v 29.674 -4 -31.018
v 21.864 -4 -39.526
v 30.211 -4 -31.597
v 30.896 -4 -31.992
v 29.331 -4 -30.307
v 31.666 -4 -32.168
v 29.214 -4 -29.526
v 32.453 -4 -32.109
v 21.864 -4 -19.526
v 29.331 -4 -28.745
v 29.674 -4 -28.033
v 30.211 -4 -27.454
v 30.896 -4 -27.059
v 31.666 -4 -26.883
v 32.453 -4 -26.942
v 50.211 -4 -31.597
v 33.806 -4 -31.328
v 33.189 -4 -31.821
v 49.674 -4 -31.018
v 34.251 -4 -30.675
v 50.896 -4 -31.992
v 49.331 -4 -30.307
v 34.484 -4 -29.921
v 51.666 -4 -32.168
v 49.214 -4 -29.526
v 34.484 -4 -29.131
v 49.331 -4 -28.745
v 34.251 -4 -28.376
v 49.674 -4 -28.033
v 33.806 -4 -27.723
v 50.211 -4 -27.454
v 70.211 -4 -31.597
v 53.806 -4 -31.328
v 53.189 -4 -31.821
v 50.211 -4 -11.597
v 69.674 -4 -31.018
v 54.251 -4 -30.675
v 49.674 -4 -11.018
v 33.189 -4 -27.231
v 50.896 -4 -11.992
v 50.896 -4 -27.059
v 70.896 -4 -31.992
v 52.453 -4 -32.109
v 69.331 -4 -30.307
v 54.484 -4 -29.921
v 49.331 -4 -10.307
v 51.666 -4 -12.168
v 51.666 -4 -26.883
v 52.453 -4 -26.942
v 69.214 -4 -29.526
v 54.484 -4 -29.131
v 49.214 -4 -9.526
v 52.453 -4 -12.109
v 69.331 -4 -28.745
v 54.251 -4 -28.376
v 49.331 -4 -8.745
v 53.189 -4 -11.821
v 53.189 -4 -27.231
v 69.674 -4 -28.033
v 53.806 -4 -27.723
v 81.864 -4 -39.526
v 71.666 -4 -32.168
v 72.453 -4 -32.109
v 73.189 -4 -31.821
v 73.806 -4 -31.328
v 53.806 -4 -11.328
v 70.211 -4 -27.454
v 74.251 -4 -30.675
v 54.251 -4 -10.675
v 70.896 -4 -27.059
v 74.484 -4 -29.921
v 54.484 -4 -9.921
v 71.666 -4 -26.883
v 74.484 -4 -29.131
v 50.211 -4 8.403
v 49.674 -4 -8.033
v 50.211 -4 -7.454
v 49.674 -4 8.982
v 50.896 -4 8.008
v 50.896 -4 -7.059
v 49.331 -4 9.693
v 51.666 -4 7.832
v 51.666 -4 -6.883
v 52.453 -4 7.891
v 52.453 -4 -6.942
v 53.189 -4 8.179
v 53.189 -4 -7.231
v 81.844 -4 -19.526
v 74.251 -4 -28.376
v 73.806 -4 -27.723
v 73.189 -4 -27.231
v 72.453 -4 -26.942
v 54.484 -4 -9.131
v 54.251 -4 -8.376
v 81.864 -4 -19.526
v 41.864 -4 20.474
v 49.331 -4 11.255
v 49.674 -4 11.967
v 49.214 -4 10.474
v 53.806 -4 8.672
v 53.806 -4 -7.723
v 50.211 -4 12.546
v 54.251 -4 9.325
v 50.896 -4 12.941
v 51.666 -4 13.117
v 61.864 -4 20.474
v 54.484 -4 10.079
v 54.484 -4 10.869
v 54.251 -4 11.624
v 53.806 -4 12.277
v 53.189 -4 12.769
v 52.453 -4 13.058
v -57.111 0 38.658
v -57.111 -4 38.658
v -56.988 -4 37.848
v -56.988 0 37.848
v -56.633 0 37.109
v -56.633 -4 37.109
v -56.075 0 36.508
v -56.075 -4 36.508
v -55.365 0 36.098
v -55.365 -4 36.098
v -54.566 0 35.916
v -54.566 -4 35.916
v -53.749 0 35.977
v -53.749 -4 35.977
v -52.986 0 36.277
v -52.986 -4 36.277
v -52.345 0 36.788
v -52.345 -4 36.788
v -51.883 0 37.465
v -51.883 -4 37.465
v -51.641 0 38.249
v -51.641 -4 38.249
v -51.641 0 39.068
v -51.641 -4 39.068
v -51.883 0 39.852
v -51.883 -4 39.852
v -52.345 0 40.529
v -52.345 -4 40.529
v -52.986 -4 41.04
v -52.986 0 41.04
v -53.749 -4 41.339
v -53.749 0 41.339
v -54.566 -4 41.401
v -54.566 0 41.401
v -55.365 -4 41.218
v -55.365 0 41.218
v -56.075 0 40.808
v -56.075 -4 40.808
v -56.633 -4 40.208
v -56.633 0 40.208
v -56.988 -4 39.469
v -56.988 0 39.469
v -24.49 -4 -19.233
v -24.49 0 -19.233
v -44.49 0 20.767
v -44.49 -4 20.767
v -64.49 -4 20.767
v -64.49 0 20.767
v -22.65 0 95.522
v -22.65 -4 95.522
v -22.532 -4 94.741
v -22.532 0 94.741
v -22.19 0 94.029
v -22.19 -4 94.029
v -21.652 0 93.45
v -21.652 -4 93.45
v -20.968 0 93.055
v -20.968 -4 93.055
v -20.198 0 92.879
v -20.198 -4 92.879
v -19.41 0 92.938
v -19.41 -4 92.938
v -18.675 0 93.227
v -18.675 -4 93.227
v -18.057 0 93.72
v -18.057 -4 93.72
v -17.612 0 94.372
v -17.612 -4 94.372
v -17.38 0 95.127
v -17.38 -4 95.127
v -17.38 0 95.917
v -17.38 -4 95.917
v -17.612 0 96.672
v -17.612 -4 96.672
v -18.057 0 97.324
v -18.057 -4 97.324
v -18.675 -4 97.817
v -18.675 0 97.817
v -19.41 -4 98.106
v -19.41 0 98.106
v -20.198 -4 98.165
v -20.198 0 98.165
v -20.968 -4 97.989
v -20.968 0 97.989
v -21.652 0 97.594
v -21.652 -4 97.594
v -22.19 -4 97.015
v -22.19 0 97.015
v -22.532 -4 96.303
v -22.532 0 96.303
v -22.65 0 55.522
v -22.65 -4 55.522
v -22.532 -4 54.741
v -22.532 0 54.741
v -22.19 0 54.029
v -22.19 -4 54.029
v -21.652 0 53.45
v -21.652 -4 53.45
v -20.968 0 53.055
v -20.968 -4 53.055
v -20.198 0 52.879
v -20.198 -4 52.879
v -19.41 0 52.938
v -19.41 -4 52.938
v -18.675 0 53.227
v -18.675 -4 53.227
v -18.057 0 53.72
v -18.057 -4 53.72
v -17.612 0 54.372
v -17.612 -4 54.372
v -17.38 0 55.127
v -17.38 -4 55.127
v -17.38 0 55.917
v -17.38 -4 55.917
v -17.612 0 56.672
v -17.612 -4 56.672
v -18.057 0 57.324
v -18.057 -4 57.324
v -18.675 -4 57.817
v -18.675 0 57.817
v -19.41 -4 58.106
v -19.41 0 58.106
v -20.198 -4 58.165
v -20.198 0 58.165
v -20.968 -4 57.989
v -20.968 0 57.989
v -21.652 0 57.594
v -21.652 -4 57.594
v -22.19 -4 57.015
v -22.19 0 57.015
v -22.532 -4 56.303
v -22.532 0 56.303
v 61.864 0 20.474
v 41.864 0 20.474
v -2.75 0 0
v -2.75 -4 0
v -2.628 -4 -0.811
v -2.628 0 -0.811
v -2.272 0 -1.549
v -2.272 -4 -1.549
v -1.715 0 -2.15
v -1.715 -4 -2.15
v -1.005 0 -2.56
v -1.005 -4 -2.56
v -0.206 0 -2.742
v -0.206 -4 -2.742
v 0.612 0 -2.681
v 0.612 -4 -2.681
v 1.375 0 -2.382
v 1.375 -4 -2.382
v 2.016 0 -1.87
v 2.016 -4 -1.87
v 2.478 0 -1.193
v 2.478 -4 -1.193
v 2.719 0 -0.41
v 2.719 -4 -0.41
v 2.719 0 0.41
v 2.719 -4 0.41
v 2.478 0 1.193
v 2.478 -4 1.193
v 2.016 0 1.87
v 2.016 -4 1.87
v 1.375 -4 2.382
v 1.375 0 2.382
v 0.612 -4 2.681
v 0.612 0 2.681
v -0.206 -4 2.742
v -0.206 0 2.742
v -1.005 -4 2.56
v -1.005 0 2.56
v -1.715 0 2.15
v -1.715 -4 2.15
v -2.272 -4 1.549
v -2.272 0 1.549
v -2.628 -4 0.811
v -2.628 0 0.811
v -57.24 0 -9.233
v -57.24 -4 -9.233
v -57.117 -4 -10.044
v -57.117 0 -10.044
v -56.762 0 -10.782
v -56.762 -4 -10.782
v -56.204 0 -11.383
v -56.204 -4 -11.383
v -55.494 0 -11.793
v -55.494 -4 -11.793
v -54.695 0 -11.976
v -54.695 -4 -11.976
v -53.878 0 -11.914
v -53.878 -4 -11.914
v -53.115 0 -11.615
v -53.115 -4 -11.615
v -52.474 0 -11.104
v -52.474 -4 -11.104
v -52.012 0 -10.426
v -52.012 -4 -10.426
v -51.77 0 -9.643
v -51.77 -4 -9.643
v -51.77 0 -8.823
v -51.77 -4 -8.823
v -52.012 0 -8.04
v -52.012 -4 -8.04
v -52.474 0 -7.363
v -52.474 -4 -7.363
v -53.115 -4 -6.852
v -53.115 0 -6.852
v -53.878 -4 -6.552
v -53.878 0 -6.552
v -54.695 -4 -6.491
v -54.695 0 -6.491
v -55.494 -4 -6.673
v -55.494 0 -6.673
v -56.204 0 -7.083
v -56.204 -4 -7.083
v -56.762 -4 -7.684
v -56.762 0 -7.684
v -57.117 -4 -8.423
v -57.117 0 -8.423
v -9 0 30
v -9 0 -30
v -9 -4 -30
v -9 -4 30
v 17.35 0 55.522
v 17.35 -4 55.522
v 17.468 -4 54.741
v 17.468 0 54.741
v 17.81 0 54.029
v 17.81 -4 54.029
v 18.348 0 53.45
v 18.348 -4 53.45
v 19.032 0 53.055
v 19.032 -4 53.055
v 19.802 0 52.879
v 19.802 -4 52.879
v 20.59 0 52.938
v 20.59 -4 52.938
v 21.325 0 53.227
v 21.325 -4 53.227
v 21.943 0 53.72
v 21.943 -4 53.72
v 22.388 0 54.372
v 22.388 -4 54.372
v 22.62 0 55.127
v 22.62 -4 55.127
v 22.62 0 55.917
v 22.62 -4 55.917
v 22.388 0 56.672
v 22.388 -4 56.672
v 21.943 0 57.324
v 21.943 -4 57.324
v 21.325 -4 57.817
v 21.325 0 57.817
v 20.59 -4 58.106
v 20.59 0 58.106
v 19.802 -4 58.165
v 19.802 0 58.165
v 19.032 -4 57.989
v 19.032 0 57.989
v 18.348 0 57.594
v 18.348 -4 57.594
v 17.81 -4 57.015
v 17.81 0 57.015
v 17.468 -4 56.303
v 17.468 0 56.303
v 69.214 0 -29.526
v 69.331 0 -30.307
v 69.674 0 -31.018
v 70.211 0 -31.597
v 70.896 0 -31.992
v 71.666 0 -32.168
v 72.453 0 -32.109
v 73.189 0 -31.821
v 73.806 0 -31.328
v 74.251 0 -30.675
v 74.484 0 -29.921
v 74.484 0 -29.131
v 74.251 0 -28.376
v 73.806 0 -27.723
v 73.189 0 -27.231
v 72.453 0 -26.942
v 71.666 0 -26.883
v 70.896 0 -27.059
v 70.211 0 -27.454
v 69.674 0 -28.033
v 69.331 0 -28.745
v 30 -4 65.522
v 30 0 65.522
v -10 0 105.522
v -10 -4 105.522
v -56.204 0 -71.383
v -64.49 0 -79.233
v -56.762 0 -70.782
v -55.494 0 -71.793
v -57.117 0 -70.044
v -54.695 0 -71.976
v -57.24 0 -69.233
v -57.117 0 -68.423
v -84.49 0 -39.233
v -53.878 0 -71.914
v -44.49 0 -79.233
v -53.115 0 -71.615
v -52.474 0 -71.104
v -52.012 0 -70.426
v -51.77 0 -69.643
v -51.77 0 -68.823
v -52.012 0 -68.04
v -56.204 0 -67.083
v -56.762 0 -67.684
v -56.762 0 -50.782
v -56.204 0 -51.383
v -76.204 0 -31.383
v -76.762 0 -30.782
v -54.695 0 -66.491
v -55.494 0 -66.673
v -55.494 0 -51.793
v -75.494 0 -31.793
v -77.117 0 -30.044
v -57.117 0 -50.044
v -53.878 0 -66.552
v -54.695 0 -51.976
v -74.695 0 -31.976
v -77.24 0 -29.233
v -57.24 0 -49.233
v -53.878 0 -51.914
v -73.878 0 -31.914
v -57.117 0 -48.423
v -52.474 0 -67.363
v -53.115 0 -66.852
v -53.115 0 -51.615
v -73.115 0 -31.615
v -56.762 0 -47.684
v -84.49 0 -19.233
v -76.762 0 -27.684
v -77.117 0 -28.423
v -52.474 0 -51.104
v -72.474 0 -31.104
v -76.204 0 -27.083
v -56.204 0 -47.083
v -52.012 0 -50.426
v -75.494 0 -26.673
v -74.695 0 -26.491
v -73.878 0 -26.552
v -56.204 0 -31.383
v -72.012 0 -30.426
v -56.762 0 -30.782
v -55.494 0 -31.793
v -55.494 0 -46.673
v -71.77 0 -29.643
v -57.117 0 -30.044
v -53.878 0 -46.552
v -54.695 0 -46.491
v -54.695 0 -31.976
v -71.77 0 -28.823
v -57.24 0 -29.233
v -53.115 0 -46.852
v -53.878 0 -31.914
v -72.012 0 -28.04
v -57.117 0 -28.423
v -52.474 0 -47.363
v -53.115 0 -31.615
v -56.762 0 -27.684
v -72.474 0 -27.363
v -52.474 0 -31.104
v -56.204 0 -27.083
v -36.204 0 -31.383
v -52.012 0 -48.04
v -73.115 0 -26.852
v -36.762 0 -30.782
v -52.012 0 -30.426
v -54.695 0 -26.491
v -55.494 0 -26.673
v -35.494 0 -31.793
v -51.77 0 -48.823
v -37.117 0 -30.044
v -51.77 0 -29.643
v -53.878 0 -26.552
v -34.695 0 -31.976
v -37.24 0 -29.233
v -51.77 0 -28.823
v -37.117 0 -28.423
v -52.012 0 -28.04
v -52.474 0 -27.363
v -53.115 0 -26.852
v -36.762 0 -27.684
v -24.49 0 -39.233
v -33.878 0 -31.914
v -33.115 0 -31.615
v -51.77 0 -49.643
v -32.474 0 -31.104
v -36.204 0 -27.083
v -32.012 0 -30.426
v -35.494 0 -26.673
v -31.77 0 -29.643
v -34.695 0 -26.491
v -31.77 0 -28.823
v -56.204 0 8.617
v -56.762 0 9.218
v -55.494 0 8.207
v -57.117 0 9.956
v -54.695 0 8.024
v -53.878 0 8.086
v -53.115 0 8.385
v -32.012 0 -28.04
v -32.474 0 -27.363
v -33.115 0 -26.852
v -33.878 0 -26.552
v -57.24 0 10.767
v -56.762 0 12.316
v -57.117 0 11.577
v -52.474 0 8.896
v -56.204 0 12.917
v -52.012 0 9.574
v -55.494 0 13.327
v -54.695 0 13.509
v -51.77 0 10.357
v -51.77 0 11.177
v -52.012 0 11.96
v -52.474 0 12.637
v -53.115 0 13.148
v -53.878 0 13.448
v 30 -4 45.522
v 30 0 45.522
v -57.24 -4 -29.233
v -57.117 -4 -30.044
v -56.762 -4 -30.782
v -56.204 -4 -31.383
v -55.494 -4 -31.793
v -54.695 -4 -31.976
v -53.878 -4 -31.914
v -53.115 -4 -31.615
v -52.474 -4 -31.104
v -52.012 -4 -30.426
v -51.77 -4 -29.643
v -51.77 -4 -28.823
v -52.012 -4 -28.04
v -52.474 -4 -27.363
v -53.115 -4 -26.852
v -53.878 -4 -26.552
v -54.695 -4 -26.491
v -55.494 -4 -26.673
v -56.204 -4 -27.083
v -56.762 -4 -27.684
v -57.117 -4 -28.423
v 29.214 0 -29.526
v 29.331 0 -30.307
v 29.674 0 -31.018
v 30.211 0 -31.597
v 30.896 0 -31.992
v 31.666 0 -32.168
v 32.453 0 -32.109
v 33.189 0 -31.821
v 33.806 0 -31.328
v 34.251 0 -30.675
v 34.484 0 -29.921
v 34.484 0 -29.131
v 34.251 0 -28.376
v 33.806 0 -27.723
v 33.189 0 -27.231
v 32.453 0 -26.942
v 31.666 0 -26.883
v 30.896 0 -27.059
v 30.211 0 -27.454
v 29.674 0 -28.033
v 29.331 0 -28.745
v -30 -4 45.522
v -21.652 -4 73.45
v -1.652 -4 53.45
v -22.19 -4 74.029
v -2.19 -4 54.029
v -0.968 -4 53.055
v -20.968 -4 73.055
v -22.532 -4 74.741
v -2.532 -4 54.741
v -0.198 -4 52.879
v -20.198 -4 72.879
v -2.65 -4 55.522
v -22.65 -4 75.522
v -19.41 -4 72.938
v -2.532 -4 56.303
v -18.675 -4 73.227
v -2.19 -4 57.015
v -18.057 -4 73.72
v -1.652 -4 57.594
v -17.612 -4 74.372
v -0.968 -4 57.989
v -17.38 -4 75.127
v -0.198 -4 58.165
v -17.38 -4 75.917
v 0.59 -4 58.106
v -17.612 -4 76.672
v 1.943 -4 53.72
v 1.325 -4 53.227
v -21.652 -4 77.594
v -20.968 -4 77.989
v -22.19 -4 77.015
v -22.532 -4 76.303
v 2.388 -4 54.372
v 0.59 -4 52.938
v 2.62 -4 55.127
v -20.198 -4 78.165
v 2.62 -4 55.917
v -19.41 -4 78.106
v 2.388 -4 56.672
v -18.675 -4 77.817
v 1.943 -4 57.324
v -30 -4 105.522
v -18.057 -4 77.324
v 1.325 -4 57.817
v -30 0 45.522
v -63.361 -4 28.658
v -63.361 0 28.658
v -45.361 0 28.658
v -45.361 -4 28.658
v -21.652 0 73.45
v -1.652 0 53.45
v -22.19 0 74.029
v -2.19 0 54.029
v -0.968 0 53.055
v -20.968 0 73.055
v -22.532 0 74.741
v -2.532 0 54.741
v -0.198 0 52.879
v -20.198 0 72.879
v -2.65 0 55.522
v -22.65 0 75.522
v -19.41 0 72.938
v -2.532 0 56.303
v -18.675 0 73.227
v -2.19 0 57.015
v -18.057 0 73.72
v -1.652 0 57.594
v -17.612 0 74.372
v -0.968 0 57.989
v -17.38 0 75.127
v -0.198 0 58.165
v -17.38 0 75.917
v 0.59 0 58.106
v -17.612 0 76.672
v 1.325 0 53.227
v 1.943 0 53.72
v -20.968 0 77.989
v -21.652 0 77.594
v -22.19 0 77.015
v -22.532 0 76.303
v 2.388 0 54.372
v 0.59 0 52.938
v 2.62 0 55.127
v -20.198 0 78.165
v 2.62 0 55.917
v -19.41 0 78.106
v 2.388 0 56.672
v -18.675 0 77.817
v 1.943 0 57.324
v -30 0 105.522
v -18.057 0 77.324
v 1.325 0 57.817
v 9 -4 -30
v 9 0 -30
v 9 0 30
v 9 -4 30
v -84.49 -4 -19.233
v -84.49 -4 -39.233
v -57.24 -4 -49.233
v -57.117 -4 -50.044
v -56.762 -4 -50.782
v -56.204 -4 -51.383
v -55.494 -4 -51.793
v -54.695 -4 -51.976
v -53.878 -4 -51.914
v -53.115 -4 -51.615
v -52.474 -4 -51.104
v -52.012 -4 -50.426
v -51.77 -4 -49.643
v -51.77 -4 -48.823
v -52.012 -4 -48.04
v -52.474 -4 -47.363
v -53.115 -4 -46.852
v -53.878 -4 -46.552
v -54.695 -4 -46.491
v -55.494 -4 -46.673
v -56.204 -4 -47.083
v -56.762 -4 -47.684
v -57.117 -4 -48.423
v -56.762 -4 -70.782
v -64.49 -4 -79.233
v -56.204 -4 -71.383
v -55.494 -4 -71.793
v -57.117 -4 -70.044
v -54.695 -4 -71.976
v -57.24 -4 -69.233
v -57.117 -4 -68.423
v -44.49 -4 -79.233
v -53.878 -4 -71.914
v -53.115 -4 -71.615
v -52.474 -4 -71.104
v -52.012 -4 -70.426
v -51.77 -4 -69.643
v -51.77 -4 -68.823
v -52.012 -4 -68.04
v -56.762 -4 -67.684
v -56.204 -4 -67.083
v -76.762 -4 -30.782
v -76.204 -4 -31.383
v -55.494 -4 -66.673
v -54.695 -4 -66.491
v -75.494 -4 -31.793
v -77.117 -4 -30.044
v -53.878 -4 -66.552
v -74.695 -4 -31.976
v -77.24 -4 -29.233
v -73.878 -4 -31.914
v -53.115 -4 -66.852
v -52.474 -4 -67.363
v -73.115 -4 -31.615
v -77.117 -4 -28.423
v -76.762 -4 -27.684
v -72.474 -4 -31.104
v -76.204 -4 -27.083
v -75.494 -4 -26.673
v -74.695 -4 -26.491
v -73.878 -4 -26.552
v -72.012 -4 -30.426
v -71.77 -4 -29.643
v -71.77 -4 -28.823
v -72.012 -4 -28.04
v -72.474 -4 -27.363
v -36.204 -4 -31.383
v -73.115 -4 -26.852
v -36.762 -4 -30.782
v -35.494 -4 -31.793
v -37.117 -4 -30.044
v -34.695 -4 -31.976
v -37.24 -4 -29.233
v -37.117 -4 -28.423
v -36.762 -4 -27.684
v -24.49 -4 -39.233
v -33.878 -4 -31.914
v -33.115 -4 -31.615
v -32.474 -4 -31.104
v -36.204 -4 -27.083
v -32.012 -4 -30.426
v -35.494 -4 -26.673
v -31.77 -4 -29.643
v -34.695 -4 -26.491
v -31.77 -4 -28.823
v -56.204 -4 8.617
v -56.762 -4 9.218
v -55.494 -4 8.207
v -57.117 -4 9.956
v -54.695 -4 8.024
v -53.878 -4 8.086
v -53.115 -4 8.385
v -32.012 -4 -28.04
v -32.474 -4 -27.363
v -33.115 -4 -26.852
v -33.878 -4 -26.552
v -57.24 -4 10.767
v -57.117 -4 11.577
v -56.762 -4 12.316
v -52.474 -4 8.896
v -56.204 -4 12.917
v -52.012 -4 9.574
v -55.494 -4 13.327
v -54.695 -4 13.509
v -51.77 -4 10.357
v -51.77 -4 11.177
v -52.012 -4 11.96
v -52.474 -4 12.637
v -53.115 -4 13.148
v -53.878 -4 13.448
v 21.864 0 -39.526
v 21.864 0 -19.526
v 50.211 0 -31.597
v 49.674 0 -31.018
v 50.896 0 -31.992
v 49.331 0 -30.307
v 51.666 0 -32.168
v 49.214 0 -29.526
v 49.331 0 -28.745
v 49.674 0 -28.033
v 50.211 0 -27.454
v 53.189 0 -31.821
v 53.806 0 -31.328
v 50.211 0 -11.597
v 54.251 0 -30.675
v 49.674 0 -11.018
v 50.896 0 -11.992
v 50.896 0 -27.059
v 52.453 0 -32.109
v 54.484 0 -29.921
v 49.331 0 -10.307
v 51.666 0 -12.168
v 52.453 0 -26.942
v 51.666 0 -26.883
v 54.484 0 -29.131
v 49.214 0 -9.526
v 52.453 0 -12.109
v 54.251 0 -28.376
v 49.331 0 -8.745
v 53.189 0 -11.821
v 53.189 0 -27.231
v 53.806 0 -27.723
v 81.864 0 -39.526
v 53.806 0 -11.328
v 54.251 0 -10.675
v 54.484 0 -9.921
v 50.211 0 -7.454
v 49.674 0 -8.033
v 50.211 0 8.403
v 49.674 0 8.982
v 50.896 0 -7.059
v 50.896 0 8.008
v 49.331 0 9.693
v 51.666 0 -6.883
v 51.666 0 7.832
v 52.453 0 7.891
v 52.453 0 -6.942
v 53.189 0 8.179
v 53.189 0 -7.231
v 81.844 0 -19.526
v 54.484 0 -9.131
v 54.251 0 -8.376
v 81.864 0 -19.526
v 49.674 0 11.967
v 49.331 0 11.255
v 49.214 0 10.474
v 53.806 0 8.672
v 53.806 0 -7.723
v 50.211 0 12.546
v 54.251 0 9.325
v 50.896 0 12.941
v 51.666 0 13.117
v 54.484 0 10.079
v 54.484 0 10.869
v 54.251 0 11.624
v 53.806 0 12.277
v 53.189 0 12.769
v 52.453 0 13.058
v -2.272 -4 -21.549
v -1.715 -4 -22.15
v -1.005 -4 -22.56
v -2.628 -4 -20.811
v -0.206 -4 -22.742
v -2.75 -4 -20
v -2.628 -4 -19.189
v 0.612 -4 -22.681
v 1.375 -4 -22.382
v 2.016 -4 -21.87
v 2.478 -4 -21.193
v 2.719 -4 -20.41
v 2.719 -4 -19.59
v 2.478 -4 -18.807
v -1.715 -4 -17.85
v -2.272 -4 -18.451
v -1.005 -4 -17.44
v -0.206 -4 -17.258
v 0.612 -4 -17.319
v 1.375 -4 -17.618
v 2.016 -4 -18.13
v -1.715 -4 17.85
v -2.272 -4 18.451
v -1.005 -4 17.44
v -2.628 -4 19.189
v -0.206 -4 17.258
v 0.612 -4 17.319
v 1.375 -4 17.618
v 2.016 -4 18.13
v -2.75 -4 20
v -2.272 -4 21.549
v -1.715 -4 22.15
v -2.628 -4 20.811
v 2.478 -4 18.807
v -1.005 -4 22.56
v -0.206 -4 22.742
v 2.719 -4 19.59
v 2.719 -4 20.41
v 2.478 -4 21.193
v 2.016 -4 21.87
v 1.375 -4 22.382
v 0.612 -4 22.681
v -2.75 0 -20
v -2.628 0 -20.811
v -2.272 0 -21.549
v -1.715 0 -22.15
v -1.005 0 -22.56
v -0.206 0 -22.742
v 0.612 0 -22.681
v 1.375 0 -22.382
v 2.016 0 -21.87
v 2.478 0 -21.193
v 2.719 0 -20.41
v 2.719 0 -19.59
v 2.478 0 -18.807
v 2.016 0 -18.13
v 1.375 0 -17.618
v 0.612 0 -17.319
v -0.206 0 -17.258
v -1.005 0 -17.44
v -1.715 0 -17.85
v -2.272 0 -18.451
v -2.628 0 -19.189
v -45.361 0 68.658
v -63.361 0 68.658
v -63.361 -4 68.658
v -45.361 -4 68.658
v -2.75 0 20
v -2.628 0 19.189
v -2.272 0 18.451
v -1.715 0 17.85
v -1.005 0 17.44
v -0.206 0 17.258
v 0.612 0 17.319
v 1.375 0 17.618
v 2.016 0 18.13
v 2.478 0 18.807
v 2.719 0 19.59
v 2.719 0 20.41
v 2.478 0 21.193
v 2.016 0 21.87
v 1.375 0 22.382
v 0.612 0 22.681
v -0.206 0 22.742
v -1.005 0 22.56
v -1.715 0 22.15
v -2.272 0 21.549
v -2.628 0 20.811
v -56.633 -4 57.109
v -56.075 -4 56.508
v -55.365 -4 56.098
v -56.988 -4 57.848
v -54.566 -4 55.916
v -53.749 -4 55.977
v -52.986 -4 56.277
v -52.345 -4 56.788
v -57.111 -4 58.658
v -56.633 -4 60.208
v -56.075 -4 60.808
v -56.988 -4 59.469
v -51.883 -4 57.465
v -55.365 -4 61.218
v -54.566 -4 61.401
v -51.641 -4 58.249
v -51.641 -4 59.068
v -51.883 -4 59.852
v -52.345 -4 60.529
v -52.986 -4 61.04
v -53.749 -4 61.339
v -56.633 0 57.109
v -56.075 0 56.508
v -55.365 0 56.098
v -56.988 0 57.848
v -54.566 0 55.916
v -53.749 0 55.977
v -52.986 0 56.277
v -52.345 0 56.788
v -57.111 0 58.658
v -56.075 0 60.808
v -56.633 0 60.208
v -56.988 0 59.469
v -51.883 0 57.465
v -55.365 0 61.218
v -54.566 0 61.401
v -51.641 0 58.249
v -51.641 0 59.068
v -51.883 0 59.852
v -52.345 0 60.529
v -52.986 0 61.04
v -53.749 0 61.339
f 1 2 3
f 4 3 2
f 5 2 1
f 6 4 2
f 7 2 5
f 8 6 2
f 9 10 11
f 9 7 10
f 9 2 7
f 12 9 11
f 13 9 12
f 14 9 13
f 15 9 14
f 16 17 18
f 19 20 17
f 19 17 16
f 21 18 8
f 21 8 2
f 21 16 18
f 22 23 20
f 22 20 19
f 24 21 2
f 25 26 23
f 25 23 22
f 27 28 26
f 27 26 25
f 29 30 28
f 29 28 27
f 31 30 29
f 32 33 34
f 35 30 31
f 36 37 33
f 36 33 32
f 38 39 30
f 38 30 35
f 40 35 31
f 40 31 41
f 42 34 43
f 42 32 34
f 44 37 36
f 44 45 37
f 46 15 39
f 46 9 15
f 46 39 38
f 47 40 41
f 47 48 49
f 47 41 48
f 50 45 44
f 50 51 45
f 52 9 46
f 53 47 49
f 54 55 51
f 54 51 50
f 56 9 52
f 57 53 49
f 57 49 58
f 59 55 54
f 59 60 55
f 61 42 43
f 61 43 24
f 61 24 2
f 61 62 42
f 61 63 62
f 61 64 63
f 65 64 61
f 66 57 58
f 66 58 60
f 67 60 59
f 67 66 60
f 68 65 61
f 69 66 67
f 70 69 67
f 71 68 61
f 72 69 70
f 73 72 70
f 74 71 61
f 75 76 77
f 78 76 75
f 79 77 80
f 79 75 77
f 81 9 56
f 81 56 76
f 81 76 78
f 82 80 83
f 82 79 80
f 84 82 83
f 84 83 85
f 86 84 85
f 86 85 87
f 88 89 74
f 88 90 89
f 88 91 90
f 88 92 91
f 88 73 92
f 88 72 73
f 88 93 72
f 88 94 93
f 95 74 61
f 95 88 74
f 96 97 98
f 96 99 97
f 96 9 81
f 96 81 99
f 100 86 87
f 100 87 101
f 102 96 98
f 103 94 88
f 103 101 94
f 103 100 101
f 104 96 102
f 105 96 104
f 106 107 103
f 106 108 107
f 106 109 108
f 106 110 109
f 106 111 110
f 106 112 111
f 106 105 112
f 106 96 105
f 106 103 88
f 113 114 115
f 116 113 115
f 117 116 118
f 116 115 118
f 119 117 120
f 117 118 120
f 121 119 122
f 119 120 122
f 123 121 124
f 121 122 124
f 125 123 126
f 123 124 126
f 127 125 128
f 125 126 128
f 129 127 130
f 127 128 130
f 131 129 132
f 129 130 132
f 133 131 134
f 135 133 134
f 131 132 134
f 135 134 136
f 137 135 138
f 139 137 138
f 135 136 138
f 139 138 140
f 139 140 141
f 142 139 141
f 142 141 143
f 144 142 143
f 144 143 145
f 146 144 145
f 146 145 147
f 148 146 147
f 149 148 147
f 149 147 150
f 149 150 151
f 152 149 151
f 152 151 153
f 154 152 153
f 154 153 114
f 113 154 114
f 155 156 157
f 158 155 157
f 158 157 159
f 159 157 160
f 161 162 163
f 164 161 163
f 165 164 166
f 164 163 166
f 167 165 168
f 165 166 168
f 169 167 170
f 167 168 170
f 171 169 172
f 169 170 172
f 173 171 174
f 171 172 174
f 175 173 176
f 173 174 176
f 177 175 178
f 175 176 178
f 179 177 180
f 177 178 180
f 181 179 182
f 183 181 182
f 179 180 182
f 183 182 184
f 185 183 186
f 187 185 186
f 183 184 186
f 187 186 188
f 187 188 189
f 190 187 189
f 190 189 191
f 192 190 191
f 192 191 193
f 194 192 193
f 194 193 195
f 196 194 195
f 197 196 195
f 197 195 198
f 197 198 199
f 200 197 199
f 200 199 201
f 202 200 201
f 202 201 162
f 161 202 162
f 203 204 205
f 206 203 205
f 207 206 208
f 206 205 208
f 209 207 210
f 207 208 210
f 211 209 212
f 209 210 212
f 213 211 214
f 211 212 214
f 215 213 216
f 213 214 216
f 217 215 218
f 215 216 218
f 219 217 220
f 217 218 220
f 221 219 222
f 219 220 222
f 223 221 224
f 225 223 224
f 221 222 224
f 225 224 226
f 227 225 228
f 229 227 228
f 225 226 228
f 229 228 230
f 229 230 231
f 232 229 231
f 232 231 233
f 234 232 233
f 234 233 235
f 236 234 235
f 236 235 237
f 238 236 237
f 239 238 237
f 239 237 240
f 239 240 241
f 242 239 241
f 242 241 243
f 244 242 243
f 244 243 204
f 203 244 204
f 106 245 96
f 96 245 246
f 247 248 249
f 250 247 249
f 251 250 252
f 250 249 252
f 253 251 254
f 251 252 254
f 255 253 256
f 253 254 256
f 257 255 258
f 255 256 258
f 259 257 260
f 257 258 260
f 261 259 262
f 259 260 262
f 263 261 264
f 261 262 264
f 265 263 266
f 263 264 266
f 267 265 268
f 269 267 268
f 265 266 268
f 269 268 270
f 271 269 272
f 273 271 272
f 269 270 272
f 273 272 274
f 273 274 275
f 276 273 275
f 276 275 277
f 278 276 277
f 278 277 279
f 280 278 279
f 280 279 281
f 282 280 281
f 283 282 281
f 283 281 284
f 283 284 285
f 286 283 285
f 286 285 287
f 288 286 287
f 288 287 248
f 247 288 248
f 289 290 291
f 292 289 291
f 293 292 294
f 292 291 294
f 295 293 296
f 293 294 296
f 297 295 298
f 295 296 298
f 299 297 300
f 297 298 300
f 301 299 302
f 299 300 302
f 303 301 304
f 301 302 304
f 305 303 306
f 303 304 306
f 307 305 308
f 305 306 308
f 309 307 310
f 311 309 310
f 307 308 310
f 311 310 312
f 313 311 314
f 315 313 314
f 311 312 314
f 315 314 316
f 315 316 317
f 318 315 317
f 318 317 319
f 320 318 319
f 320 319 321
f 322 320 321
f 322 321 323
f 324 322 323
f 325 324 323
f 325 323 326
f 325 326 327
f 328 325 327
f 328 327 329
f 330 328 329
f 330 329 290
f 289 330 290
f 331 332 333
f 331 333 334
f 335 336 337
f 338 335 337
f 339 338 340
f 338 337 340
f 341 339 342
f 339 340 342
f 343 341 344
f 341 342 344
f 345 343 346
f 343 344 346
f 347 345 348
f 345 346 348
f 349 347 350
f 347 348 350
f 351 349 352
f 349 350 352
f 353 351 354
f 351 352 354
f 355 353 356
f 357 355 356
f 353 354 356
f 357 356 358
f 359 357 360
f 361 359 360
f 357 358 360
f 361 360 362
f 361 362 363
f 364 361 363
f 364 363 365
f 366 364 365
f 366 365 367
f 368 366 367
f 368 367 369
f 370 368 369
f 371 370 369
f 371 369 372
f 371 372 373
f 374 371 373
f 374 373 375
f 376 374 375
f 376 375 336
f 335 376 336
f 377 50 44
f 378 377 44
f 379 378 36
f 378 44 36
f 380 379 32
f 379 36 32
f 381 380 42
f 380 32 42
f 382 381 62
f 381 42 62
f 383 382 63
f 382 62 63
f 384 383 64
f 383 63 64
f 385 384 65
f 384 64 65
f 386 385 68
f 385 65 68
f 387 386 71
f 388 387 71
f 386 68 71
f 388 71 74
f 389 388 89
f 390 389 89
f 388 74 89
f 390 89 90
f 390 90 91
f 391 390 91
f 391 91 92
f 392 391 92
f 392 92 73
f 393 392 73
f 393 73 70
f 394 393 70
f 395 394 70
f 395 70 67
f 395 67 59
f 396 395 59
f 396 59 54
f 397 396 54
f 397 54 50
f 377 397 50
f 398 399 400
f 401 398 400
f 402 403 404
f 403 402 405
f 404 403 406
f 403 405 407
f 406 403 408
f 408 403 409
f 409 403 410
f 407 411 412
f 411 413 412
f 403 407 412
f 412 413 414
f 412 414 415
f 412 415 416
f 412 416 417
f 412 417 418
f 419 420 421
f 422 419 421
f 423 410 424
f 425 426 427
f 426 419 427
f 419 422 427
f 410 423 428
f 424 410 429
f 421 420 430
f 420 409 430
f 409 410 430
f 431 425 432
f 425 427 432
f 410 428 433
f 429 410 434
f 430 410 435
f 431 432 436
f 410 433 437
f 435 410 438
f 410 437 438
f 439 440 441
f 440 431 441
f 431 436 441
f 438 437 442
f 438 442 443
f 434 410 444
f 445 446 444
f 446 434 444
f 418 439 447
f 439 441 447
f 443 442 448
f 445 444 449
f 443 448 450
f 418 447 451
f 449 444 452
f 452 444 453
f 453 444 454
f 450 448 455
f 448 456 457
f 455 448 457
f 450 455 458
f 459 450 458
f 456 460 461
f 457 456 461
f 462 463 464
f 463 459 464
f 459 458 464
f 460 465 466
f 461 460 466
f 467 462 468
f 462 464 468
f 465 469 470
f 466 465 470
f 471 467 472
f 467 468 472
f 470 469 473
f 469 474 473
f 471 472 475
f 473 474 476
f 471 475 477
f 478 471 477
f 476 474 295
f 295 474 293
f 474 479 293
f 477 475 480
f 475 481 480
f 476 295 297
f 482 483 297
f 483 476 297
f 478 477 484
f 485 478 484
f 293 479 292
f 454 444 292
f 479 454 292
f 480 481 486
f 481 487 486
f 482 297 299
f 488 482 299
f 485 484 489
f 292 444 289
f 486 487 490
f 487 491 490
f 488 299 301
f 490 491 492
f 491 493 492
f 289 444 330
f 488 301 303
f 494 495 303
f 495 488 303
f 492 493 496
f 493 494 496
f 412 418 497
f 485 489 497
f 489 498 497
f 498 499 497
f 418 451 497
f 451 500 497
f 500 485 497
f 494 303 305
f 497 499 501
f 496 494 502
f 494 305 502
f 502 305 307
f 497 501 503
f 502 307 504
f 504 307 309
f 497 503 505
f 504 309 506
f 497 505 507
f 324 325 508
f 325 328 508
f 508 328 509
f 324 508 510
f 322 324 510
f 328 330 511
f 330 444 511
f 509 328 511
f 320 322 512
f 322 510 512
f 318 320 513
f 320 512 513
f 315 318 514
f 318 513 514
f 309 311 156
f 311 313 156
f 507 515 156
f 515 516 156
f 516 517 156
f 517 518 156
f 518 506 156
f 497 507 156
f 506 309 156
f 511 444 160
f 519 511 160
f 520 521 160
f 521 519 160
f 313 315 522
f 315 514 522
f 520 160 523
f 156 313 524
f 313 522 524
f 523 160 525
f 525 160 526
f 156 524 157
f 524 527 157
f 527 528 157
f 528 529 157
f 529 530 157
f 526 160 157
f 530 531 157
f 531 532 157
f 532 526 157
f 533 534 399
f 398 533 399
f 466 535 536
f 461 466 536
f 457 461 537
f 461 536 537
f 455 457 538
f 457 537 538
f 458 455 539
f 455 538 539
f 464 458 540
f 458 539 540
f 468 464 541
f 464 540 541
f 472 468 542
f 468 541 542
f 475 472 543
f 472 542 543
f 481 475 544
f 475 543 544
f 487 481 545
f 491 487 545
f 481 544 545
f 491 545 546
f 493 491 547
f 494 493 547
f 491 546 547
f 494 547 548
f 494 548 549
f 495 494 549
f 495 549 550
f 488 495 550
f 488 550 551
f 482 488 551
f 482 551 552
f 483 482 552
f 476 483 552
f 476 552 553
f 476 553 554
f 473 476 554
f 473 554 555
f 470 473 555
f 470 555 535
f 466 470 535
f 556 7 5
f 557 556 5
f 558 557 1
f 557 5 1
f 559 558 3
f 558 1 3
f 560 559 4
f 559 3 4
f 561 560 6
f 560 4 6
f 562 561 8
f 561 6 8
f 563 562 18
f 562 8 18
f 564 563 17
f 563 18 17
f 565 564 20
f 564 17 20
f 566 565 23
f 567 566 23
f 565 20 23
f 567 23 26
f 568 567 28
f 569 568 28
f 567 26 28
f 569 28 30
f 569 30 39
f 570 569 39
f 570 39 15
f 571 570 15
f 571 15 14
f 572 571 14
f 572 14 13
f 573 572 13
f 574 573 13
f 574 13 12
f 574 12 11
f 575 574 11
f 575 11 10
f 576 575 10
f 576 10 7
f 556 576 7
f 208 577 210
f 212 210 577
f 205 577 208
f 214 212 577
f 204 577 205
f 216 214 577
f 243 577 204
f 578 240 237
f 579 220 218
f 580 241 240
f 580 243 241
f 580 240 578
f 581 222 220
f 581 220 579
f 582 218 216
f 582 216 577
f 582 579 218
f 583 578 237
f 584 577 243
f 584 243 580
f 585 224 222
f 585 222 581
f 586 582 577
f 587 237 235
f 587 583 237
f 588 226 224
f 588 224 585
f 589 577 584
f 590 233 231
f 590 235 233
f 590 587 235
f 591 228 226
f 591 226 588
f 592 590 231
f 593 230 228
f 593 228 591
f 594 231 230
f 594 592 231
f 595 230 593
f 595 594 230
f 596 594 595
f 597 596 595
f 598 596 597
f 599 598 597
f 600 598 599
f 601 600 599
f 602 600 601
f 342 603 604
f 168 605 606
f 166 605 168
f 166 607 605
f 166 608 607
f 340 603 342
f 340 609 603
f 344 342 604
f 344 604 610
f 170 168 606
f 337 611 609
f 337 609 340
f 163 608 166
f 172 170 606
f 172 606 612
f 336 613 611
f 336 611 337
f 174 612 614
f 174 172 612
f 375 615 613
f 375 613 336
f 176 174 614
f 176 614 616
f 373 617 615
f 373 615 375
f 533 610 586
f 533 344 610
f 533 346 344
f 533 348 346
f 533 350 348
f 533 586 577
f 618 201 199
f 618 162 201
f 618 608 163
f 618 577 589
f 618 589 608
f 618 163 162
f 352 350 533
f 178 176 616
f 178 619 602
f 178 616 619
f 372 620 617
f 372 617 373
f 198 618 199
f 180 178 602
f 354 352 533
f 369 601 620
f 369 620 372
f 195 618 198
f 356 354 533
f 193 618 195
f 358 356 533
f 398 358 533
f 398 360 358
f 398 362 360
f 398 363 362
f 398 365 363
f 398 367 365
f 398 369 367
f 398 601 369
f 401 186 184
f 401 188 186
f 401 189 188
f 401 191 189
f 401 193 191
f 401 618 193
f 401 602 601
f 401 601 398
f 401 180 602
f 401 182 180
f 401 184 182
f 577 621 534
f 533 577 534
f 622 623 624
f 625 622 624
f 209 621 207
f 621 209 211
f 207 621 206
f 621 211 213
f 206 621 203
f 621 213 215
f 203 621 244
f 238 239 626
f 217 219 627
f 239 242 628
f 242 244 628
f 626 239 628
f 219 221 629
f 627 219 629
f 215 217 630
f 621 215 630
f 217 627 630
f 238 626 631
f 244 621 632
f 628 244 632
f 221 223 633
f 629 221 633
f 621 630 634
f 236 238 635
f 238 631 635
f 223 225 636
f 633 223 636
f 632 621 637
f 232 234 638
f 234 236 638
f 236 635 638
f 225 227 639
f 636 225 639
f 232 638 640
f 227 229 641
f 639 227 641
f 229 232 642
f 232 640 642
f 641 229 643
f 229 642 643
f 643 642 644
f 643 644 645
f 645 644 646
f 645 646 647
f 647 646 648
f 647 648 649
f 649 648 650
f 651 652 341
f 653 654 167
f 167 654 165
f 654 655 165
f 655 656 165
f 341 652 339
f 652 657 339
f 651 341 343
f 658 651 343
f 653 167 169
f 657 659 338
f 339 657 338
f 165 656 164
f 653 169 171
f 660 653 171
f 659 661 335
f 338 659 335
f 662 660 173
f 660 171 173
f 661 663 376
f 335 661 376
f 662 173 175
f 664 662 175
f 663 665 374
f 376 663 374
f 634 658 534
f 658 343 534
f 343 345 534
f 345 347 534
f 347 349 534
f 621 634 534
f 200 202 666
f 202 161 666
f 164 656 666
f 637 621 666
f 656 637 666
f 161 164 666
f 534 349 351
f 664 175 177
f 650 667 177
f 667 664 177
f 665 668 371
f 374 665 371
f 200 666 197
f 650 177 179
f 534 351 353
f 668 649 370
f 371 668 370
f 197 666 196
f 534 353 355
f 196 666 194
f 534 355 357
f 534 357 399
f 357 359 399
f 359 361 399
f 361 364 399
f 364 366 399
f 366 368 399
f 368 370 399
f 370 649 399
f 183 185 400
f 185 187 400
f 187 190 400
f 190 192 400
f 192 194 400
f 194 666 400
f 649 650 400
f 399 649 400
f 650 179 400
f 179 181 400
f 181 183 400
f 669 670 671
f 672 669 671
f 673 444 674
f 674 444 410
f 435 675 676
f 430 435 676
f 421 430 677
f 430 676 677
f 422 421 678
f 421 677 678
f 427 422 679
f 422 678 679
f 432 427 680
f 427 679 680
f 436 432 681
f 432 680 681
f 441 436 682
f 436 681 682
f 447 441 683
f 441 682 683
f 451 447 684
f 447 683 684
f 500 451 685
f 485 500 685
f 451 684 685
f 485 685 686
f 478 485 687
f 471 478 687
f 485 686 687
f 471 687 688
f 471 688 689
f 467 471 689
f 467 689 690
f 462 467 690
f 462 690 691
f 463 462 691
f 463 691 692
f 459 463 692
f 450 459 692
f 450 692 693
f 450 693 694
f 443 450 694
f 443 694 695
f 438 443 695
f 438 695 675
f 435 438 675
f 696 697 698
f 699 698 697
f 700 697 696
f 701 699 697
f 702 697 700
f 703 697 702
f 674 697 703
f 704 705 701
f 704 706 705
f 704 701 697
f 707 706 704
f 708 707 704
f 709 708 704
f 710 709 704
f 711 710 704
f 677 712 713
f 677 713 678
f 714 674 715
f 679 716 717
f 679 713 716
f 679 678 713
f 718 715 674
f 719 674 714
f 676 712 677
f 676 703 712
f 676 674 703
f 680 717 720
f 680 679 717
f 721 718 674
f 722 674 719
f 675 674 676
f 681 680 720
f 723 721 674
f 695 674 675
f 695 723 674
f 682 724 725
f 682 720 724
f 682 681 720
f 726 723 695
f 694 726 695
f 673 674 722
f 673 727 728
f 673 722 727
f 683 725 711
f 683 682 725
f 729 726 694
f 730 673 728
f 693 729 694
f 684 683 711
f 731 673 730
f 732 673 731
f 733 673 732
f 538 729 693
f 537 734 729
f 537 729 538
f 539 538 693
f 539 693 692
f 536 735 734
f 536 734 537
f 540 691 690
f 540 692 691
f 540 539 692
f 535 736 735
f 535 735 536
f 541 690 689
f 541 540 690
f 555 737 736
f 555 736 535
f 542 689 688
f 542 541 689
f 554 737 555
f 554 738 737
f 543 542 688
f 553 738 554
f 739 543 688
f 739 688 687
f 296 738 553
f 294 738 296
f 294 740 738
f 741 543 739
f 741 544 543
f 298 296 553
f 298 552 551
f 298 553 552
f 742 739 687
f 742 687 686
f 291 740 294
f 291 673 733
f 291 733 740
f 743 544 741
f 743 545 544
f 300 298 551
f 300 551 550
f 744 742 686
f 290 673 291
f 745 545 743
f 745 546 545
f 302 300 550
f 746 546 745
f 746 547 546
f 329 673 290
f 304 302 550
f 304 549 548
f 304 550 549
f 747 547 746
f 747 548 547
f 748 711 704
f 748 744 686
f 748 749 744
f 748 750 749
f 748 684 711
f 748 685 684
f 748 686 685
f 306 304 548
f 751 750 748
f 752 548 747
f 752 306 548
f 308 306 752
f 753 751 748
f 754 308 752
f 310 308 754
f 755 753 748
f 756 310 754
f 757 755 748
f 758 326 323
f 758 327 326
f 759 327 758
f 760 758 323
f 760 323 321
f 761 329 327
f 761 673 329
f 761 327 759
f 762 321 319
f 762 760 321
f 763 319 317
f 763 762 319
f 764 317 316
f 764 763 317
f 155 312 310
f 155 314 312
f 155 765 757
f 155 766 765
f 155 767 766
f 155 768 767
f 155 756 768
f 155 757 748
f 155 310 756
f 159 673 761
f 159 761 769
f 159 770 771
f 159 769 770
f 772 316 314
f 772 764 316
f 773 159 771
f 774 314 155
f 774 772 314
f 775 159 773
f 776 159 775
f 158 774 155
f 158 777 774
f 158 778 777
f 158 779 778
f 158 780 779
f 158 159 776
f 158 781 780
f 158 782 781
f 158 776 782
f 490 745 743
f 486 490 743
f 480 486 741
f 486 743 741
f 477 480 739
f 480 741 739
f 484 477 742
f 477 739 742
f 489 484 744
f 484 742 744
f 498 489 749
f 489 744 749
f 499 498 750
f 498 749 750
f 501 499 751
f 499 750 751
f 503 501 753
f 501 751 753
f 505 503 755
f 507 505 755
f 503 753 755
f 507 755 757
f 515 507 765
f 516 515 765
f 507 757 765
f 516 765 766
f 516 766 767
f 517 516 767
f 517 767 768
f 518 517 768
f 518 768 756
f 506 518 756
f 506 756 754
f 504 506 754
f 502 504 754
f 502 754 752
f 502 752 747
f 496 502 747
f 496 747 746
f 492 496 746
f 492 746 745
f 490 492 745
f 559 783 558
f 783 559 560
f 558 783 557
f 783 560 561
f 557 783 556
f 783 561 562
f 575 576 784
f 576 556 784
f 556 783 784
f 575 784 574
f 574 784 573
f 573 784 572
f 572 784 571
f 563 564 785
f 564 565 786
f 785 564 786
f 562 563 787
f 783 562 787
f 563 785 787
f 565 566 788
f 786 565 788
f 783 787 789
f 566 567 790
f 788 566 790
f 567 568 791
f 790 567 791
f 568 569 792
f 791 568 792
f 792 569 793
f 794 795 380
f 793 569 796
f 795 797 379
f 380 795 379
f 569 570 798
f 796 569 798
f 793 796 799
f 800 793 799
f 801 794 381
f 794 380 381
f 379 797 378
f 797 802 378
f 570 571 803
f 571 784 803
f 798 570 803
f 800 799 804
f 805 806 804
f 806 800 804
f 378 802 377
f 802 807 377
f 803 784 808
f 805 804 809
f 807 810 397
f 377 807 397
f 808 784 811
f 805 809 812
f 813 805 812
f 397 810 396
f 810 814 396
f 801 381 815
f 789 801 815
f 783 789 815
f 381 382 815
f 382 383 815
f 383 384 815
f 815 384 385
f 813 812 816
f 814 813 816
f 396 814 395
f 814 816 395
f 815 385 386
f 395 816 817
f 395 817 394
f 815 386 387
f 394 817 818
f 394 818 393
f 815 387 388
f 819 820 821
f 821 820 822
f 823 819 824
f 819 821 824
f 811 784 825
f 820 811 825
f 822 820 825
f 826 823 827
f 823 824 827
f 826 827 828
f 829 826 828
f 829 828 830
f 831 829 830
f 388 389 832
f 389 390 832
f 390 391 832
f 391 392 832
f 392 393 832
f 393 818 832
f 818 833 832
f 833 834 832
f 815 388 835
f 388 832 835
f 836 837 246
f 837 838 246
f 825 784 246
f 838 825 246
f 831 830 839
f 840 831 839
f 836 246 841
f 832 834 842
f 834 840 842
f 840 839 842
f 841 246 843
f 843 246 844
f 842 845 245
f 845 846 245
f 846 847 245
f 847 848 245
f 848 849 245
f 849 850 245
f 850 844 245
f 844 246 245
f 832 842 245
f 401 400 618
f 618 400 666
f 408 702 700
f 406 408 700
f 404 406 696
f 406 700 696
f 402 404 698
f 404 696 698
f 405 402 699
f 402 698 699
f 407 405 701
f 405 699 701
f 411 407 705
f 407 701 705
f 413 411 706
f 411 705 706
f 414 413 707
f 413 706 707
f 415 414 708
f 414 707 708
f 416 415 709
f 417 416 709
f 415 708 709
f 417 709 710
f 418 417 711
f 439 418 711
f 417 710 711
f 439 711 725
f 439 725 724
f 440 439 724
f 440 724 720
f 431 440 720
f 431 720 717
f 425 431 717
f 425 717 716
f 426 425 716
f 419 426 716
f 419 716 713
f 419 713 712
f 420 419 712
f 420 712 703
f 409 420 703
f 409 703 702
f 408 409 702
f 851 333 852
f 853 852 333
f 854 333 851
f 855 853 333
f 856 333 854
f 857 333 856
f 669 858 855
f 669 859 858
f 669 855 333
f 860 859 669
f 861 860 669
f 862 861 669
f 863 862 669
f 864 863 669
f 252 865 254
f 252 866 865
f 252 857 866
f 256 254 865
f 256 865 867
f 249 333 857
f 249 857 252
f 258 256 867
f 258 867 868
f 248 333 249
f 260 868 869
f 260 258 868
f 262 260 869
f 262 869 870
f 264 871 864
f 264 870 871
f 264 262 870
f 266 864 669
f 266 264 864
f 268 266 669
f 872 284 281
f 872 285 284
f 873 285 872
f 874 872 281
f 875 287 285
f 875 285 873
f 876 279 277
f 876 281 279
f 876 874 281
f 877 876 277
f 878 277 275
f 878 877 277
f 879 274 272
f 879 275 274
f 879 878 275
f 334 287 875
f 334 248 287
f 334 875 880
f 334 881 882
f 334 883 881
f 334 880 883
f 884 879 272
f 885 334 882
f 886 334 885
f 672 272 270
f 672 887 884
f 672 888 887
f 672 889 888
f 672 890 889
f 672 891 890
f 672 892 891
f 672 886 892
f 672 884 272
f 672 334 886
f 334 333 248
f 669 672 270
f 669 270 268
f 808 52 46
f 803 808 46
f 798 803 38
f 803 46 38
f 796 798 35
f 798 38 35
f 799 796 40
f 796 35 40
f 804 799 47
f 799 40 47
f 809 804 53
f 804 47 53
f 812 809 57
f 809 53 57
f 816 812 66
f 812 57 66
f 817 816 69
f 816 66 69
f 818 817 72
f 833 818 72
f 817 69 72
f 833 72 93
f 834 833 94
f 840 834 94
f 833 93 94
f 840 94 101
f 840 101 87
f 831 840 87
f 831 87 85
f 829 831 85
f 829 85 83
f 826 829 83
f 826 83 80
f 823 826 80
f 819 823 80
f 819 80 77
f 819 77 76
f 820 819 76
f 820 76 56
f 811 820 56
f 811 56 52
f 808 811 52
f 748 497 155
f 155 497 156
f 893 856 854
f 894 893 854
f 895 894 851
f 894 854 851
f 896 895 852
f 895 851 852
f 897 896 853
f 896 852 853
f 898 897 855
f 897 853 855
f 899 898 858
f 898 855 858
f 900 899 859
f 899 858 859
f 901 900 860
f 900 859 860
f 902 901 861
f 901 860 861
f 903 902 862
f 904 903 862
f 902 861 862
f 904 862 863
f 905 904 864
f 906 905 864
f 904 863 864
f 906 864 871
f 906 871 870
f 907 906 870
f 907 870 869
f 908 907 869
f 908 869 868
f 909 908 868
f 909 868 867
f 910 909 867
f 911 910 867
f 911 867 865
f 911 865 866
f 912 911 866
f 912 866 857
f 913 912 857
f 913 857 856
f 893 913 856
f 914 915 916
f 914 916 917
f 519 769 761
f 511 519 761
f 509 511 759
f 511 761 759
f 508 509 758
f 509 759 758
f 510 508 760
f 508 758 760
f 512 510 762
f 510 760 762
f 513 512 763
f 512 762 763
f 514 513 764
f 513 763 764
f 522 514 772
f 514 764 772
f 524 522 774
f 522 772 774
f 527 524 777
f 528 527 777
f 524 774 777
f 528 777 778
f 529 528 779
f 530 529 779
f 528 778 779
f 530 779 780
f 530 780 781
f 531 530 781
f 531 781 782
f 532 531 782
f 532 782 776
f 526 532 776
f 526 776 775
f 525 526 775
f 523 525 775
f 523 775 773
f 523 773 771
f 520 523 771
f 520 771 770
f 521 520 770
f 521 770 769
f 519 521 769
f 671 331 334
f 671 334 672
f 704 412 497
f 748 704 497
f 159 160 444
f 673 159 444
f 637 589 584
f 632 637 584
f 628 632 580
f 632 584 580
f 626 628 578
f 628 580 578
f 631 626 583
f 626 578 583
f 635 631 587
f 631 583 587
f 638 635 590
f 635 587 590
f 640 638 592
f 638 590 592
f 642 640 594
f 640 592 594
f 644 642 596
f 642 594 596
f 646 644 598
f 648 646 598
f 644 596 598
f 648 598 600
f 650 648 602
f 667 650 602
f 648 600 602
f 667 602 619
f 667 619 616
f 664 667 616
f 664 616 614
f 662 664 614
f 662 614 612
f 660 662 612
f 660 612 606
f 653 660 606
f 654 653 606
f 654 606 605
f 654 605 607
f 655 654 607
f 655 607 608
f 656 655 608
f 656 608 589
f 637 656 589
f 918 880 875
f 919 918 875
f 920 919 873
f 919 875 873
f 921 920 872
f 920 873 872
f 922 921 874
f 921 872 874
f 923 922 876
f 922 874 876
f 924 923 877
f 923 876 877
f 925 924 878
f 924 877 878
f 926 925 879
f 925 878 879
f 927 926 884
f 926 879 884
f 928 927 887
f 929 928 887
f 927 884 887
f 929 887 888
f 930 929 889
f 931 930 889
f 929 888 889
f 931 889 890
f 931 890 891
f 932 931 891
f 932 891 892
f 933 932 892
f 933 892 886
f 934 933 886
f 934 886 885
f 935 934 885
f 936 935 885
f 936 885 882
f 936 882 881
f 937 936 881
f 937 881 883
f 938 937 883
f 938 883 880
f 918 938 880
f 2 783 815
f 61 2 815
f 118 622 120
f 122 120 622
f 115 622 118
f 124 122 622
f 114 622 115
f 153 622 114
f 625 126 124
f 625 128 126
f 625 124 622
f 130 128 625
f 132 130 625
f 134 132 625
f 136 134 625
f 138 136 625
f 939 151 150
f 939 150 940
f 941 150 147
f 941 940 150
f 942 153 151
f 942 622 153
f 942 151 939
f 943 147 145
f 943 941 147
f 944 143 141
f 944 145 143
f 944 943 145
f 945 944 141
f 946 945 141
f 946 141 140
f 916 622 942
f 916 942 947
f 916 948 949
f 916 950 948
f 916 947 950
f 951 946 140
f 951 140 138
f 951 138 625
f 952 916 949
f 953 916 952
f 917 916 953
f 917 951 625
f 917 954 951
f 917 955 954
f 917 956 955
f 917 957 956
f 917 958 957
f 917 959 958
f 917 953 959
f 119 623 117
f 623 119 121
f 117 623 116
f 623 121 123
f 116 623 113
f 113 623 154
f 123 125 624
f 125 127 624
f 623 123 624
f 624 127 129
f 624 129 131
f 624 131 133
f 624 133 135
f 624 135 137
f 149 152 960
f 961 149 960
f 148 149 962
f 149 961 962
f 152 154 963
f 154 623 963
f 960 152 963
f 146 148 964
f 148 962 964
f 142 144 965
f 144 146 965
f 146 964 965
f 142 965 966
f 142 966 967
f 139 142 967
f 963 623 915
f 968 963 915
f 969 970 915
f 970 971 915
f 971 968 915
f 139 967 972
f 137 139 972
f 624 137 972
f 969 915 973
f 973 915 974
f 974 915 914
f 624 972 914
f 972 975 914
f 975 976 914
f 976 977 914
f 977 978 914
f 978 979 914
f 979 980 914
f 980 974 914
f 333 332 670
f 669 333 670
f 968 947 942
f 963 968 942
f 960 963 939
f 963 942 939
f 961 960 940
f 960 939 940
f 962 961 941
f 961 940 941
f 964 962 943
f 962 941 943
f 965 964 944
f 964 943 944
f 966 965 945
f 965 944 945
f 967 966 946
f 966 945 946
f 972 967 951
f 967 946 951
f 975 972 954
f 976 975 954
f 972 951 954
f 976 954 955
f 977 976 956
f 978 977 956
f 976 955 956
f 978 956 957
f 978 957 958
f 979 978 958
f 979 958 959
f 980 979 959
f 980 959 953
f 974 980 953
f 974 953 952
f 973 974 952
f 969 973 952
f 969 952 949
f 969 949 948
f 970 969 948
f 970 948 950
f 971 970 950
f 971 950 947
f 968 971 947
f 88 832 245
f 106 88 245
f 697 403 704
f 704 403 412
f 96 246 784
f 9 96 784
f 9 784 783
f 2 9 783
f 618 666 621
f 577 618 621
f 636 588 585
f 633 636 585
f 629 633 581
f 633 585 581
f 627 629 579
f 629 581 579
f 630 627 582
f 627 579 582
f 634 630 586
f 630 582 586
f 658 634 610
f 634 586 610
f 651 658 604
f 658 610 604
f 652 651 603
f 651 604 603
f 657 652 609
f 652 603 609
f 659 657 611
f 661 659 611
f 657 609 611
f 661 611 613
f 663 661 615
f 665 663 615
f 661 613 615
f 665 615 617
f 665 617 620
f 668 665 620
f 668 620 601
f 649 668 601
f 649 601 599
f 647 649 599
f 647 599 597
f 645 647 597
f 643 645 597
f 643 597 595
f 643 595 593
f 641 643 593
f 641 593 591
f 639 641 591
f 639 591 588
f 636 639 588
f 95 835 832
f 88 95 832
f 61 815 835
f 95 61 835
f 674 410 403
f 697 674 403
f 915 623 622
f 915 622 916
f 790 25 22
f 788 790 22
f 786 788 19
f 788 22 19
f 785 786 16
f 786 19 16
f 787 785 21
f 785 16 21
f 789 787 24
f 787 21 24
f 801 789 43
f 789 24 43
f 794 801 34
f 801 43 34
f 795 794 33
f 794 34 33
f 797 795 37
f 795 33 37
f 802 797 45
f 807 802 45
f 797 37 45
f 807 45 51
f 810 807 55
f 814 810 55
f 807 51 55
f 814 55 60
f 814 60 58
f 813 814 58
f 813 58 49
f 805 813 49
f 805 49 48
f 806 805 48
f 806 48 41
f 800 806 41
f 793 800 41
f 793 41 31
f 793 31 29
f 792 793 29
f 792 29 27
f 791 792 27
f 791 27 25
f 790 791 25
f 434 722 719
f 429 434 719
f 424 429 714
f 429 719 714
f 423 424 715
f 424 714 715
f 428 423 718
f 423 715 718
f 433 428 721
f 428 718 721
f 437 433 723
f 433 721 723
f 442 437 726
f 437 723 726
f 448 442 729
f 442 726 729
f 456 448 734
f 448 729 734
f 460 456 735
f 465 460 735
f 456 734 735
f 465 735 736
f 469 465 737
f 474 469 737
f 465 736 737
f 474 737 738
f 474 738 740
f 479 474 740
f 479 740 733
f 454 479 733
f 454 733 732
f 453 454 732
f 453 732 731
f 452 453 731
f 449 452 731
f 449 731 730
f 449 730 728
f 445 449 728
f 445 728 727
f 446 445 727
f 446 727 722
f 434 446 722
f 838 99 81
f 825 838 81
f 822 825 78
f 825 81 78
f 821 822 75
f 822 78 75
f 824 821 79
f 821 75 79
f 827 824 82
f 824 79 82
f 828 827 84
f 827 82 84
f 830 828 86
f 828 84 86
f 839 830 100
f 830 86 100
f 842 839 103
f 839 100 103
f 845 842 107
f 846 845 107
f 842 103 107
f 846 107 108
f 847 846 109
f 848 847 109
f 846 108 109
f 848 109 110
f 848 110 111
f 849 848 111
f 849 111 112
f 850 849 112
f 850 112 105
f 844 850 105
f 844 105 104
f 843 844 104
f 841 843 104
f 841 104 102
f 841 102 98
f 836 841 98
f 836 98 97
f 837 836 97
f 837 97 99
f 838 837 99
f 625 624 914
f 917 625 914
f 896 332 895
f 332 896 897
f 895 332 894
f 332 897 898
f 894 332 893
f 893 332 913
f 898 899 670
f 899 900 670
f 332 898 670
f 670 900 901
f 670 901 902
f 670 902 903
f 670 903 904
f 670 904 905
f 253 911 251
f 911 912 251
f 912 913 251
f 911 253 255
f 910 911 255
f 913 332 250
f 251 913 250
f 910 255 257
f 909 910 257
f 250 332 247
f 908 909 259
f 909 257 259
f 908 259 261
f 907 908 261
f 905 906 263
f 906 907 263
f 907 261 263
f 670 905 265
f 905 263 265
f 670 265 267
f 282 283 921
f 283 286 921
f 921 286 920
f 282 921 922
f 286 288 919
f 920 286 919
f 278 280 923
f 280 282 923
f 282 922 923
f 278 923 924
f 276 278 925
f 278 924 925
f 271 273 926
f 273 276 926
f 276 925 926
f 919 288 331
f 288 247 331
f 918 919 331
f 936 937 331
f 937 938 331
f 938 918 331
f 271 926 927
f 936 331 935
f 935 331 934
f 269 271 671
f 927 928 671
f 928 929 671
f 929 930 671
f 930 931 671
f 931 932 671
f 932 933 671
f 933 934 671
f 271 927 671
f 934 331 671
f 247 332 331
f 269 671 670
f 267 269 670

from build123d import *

# Parameters (mm, degrees)
F1_DEPTH  = 4
F2_D      = 5.3
F2_DEPTH  = 12.7
F2_TIP    = 1.5922806404
F4_DEPTH  = 4
F5_D      = 5.3
F5_DEPTH  = 12.7
F5_TIP    = 1.5922806404
F7_DEPTH  = 4
F8_D      = 5.5
F8_DEPTH  = 12.7
F8_TIP    = 1.6523667023
F9_W      = 18
F9_H      = 40
F10_DEPTH = 4
F11_D     = 5.5
F11_DEPTH = 12.7
F11_TIP   = 1.6523667023
F12_W     = 18
F12_H     = 60
F13_DEPTH = 4
F14_D     = 5.5
F14_DEPTH = 12.7
F14_TIP   = 1.6523667023


with BuildPart() as f1:
    # F0 (on Front) → F1 (new body)
    with BuildSketch(Plane.XZ):
        Polygon((-30, 105.5219832063), (-30, 45.5219832063), (30, 45.5219832063), (30, 65.5219832063), (-10, 105.5219832063), align=None)
    extrude(amount=F1_DEPTH)

    # F2
    with Locations(Plane(origin=(0, 0, 0), x_dir=(1, 0, 0), z_dir=(0, 1, 0))):
        with Locations((-20, -95.5219832063), (-20, -75.5219832063), (-20, -55.5219832063), (0, -55.5219832063), (20, -55.5219832063)):
            Hole(F2_D / 2, depth=F2_DEPTH)
            with Locations((0, 0, -(F2_DEPTH + F2_TIP / 2))):  # 118° drill point
                Cone(0, F2_D / 2, F2_TIP, mode=Mode.SUBTRACT)


with BuildPart() as f4:
    # F3 (on Front) → F4 (new body)
    with BuildSketch(Plane.XZ):
        Polygon((21.8637231737, -19.5256303996), (21.8637231737, -39.5256303996), (41.8637231737, -39.5256303996), (61.8637231737, -39.5256303996), (81.8637231737, -39.5256303996), (81.8637231737, -19.5256303996), (81.8442031741, -19.5256303996), (61.8637231737, 20.4743696004), (41.8637231737, 20.4743696004), align=None)
    extrude(amount=F4_DEPTH)

    # F5
    with Locations(Plane(origin=(0, 0, 0), x_dir=(1, 0, 0), z_dir=(0, 1, 0))):
        with Locations((51.8637231737, 29.5256303996), (31.8637231737, 29.5256303996), (71.8637231737, 29.5256303996), (51.8637231737, 9.5256303996), (51.8637231737, -10.4743696004)):
            Hole(F5_D / 2, depth=F5_DEPTH)
            with Locations((0, 0, -(F5_DEPTH + F5_TIP / 2))):  # 118° drill point
                Cone(0, F5_D / 2, F5_TIP, mode=Mode.SUBTRACT)


with BuildPart() as f7:
    # F6 (on Front) → F7 (new body)
    with BuildSketch(Plane.XZ):
        Polygon((-64.4896663725, -79.2333139479), (-44.4896663725, -79.2333139479), (-24.4896663725, -39.2333139479), (-24.4896663725, -19.2333139479), (-44.4896663725, 20.7666860521), (-64.4896663725, 20.7666860521), (-84.4896663725, -19.2333139479), (-84.4896663725, -39.2333139479), align=None)
    extrude(amount=F7_DEPTH)

    # F8
    with Locations(Plane(origin=(0, 0, 0), x_dir=(1, 0, 0), z_dir=(0, 1, 0))):
        with Locations((-54.4896663725, 69.2333139479), (-54.4896663725, 49.2333139479), (-74.4896663725, 29.2333139479), (-54.4896663725, 29.2333139479), (-34.4896663725, 29.2333139479), (-54.4896663725, 9.2333139479), (-54.4896663725, -10.7666860521)):
            Hole(F8_D / 2, depth=F8_DEPTH)
            with Locations((0, 0, -(F8_DEPTH + F8_TIP / 2))):  # 118° drill point
                Cone(0, F8_D / 2, F8_TIP, mode=Mode.SUBTRACT)


with BuildPart() as f10:
    # F9 (on Front) → F10 (new body)
    with BuildSketch(Plane.XZ):
        with Locations((-54.3606247902, 48.6583974957)):
            Rectangle(F9_W, F9_H)
    extrude(amount=F10_DEPTH)

    # F11
    with Locations(Plane(origin=(0, 0, 0), x_dir=(1, 0, 0), z_dir=(0, 1, 0))):
        with Locations((-54.3606247902, -58.6583974957), (-54.3606247902, -38.6583974957)):
            Hole(F11_D / 2, depth=F11_DEPTH)
            with Locations((0, 0, -(F11_DEPTH + F11_TIP / 2))):  # 118° drill point
                Cone(0, F11_D / 2, F11_TIP, mode=Mode.SUBTRACT)


with BuildPart() as f13:
    # F12 (on Front) → F13 (new body)
    with BuildSketch(Plane.XZ):
        Rectangle(F12_W, F12_H)
    extrude(amount=F13_DEPTH)

    # F14
    with Locations(Plane(origin=(0, 0, 0), x_dir=(1, 0, 0), z_dir=(0, 1, 0))):
        with Locations((0, -20), (0, 0), (0, 20)):
            Hole(F14_D / 2, depth=F14_DEPTH)
            with Locations((0, 0, -(F14_DEPTH + F14_TIP / 2))):  # 118° drill point
                Cone(0, F14_D / 2, F14_TIP, mode=Mode.SUBTRACT)


solid = Compound([f1.part, f4.part, f7.part, f10.part, f13.part])
